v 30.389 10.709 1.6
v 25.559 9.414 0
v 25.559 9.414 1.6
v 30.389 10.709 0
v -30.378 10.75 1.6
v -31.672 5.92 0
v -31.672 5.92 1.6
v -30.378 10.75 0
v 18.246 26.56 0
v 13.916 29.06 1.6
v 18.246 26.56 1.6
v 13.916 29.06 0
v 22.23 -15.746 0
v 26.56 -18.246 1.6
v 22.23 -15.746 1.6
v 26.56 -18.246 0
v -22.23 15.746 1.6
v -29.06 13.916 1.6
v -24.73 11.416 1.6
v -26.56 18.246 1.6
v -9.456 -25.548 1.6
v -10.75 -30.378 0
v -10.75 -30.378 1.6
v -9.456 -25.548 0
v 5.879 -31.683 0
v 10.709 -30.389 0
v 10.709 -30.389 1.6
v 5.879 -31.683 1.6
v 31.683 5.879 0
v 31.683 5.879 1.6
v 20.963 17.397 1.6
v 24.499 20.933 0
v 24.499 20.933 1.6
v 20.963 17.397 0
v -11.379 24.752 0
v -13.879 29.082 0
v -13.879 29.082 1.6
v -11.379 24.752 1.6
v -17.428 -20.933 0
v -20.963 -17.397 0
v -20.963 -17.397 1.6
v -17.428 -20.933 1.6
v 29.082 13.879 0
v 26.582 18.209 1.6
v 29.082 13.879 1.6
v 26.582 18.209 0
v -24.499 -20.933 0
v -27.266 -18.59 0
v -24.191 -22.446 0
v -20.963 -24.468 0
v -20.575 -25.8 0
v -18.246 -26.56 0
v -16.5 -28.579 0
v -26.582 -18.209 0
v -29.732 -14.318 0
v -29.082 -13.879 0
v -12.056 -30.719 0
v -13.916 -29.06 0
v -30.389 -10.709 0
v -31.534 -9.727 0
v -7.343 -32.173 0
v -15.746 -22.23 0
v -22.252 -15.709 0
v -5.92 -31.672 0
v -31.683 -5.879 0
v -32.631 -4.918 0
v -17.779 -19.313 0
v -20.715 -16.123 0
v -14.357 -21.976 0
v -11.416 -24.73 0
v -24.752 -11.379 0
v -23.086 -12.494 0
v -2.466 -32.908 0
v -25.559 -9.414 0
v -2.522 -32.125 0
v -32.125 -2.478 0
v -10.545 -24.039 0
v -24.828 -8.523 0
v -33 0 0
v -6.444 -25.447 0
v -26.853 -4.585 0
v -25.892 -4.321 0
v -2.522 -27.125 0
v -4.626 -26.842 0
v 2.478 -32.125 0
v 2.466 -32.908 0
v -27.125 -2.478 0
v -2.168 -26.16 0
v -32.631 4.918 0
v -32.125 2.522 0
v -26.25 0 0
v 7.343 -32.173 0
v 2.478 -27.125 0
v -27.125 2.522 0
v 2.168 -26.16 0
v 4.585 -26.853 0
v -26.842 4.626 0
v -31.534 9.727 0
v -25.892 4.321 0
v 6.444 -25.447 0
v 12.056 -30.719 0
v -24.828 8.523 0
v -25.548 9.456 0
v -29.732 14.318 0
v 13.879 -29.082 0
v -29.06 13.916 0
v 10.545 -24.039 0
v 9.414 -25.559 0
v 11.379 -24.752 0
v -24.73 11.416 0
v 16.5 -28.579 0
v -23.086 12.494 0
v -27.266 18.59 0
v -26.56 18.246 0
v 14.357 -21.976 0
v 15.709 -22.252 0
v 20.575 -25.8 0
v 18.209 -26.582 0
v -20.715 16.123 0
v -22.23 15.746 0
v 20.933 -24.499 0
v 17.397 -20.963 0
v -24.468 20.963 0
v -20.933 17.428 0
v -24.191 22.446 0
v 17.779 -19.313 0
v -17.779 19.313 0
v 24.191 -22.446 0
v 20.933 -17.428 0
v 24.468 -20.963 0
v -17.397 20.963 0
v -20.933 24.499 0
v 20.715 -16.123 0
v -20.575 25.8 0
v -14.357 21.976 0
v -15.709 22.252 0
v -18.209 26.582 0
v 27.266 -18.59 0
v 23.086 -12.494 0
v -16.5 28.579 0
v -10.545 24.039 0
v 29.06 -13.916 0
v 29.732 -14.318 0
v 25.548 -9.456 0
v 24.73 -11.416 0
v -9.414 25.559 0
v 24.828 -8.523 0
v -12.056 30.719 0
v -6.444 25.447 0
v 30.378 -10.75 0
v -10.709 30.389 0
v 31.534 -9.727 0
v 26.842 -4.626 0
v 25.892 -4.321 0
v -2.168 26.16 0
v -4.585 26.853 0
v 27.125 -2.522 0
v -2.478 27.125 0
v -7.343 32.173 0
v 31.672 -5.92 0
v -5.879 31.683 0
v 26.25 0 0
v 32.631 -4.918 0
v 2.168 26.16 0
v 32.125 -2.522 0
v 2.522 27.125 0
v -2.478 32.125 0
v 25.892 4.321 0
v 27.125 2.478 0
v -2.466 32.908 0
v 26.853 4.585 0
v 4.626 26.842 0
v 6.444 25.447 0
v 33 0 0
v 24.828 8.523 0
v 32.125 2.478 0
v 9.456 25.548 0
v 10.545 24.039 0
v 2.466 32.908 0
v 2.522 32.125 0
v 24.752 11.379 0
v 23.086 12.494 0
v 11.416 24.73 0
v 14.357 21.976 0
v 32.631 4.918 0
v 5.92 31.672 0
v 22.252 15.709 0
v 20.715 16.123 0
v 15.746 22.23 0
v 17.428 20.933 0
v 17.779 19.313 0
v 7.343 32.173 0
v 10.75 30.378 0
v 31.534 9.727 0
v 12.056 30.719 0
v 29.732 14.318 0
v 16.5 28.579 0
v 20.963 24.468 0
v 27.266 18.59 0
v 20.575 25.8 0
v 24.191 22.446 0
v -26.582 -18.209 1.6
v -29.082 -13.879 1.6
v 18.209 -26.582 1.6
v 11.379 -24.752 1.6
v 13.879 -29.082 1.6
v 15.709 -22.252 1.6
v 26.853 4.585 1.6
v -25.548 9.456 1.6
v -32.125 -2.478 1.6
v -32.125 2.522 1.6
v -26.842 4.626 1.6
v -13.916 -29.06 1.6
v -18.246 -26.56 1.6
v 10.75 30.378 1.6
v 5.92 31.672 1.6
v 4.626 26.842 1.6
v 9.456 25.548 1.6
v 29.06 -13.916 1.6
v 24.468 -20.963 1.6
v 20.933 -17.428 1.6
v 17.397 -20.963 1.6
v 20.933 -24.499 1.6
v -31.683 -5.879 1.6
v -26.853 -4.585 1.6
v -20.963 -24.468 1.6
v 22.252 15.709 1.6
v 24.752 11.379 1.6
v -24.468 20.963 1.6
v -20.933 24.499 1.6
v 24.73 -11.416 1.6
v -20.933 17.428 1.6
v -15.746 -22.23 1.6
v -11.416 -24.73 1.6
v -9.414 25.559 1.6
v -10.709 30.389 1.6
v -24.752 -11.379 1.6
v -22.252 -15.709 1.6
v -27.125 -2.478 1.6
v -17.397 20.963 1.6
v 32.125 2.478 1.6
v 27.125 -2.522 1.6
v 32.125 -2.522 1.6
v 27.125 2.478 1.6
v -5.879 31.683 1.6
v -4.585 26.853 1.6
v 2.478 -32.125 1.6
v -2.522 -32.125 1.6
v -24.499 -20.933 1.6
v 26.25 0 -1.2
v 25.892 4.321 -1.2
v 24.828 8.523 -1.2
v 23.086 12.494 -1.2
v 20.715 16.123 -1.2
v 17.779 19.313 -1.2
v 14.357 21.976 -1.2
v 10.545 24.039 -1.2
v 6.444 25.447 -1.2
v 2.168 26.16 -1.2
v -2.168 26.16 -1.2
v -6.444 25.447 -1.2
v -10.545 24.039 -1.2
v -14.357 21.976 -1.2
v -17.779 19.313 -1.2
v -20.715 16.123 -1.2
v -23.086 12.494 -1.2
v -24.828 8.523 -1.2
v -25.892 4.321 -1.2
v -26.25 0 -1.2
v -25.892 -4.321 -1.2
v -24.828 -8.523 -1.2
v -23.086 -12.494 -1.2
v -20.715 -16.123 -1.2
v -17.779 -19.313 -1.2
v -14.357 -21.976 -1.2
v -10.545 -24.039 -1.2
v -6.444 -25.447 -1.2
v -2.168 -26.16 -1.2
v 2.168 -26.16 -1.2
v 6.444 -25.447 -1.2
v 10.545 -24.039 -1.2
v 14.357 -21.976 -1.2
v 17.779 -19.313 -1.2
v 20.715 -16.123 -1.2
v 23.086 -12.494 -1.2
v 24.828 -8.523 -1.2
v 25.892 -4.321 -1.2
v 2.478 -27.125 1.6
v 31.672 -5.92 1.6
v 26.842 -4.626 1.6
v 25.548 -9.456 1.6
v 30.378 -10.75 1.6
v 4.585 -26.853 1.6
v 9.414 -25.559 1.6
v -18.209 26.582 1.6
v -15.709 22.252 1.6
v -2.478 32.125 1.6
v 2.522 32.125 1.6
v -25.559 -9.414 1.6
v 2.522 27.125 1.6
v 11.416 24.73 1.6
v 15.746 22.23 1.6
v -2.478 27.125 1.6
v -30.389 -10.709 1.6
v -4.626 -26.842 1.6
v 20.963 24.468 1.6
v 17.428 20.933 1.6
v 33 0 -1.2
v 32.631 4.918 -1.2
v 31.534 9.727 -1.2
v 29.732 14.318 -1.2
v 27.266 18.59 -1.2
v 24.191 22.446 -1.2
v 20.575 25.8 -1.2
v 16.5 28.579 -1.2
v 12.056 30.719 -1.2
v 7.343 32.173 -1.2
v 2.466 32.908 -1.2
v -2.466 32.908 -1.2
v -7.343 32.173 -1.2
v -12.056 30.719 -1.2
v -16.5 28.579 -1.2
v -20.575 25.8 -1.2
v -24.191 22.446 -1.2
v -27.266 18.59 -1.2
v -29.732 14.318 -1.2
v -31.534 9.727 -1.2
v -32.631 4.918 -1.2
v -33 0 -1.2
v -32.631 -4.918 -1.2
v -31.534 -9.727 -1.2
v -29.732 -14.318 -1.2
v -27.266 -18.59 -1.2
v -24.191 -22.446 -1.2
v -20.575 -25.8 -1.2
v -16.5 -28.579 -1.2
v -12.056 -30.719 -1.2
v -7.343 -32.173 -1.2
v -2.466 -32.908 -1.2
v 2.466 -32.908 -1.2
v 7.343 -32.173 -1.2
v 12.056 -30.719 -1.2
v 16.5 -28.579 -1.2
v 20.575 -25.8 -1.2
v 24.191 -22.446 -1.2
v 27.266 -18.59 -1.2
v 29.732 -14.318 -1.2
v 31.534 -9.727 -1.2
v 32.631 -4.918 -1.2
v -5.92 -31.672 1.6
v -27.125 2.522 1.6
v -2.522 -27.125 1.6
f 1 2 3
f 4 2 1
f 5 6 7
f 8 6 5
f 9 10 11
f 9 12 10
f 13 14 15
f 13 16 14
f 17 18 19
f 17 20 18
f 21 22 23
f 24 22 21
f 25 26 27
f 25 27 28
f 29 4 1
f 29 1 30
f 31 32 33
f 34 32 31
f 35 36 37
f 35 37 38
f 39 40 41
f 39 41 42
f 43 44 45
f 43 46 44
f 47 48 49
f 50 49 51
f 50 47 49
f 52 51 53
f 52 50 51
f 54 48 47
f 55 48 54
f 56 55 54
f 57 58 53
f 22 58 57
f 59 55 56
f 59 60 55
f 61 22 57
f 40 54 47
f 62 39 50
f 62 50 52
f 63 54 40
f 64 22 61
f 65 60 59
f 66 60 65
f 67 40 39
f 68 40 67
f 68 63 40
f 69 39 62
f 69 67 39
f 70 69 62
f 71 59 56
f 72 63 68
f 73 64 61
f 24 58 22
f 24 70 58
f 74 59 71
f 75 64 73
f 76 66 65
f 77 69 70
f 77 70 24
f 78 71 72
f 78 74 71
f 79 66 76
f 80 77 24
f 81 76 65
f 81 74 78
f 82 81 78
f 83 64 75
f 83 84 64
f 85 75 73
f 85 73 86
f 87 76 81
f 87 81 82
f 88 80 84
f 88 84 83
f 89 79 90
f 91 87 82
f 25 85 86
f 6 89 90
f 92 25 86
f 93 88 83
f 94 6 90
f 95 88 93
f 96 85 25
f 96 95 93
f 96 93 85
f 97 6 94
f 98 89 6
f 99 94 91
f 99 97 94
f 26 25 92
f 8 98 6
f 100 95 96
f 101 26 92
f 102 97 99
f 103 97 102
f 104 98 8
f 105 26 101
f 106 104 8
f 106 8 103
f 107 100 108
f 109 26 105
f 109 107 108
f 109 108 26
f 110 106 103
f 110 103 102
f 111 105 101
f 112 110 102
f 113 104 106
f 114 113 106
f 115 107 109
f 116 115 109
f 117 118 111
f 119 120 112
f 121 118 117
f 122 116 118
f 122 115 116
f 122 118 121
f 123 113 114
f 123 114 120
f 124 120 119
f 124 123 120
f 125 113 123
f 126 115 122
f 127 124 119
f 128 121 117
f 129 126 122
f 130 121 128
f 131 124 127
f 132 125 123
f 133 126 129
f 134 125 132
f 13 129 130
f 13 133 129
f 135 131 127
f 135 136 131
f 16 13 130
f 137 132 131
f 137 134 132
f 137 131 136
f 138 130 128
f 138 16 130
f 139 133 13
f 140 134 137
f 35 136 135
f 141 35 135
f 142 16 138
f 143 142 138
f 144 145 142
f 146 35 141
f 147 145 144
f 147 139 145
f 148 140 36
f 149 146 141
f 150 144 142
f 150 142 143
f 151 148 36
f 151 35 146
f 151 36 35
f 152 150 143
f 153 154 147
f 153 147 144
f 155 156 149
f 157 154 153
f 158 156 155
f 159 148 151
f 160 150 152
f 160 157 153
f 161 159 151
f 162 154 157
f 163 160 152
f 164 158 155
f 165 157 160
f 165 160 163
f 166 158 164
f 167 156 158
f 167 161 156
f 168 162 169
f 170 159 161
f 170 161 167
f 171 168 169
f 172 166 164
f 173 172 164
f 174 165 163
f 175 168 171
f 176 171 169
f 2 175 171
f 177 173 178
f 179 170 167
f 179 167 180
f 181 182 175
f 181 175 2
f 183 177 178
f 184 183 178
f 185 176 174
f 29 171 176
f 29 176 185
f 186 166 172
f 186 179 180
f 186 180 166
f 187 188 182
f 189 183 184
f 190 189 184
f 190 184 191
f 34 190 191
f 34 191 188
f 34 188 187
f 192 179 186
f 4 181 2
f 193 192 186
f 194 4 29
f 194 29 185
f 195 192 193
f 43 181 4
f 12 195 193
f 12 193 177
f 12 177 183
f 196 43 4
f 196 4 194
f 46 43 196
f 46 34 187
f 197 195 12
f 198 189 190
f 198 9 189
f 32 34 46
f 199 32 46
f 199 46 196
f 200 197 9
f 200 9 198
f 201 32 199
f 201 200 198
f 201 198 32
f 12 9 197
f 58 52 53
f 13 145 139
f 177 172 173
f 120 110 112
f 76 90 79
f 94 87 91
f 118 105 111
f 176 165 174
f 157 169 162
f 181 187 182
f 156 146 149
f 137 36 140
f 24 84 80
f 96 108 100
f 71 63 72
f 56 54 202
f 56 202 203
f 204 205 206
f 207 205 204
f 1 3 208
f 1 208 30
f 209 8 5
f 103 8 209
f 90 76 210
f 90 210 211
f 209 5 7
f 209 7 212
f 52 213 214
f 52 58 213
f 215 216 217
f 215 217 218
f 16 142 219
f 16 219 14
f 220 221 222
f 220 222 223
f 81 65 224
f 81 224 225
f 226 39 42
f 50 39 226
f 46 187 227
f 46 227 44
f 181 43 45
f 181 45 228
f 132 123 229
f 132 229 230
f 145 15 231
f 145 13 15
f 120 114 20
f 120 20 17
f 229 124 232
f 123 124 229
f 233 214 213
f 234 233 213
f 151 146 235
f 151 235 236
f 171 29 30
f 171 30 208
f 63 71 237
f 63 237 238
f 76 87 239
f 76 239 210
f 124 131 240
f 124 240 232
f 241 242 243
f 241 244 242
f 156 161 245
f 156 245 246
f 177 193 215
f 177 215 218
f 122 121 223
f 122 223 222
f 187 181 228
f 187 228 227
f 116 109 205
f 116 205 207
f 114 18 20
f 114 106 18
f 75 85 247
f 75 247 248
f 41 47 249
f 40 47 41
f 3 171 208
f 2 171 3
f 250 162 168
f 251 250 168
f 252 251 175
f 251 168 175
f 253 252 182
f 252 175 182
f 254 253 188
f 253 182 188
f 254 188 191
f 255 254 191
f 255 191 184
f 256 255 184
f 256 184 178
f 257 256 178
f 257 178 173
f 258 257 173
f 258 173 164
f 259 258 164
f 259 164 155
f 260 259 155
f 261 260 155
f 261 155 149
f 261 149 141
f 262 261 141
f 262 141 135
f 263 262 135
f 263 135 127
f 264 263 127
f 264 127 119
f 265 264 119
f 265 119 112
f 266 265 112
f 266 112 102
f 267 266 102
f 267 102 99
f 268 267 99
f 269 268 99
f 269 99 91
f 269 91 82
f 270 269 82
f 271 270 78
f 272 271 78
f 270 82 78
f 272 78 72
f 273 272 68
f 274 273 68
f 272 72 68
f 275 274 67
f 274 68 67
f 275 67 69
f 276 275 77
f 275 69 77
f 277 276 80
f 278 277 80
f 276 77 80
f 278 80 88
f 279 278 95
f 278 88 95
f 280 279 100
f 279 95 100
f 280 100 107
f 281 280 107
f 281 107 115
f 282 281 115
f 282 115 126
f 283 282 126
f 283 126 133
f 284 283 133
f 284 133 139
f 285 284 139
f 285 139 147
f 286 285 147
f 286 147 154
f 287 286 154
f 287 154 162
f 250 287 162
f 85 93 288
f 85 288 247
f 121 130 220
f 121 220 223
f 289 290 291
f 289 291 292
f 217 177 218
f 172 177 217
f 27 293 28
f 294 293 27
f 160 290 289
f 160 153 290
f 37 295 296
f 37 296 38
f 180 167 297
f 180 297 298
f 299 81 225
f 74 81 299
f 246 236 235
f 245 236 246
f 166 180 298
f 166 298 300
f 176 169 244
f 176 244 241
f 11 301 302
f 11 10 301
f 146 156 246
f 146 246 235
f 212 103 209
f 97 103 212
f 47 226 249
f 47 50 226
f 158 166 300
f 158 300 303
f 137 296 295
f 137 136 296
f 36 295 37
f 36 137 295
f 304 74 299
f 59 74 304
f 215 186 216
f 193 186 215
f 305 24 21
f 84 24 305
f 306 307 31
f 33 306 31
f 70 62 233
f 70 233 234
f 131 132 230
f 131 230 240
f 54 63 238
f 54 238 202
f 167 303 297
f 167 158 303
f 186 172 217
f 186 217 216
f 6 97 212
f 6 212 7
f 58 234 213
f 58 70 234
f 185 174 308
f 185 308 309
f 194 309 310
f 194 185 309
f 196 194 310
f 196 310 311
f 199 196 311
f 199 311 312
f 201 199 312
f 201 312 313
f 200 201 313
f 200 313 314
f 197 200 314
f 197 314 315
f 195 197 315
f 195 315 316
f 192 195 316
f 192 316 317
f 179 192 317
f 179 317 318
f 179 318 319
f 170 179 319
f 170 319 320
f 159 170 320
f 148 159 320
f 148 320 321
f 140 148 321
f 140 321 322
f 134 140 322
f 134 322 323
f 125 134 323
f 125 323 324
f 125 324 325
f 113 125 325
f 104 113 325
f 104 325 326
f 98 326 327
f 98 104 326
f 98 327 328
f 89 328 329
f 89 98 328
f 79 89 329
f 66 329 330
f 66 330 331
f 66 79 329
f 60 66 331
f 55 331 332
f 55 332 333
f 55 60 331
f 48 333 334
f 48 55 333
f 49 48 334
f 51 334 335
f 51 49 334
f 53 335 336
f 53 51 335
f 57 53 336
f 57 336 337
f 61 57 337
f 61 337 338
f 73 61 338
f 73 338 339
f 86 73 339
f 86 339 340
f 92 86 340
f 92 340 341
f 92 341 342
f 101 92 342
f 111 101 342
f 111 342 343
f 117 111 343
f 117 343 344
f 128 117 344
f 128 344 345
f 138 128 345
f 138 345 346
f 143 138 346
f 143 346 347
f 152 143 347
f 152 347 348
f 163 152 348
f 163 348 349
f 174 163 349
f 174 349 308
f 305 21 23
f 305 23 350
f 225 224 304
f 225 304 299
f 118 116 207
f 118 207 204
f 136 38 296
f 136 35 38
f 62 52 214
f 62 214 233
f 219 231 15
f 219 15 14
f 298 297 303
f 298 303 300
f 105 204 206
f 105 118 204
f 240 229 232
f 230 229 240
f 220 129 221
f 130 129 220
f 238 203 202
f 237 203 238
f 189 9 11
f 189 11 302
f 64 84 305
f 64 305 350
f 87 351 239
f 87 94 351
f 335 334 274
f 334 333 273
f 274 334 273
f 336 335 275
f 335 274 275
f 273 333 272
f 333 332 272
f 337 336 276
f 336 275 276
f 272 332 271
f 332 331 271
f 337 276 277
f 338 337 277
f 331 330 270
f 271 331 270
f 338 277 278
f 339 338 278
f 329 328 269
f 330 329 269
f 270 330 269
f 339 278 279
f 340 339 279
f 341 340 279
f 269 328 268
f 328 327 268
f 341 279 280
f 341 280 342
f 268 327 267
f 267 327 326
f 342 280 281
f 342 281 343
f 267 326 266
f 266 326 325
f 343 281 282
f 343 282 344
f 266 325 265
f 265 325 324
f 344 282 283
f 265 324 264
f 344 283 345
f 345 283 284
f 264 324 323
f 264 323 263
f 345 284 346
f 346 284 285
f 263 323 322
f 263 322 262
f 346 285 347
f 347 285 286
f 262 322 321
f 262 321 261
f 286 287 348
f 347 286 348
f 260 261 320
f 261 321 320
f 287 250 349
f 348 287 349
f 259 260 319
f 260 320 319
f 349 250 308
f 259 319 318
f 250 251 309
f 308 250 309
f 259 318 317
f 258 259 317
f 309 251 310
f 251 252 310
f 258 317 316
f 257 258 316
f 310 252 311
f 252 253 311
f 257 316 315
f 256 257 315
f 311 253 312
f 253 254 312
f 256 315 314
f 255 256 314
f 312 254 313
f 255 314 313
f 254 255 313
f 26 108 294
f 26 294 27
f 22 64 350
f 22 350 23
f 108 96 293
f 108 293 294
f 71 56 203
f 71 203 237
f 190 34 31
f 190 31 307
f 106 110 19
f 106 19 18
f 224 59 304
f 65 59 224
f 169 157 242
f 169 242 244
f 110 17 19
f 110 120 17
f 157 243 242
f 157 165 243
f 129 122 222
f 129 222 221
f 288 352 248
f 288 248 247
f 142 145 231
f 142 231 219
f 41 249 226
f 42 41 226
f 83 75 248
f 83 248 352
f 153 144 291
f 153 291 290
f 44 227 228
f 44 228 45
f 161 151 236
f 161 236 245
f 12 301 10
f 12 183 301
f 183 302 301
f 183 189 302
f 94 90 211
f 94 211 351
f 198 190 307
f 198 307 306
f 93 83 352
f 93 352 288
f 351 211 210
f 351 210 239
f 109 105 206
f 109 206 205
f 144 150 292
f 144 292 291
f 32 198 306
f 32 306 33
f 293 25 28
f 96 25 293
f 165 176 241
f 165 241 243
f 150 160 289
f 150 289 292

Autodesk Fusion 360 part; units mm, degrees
sketch "Sketch1" plane through (0, 0, 0) normal (0, 0, 1) x (1, 0, 0)
  circle A0 centre (0, 0) radius 33
  circle A1 centre (0, 0) radius 26.25
  line L0 (0.0215, 33) -> (0.0215, 26.25) construction
  line L1 (2.5215, 27.125) -> (-2.4785, 27.125)
  line L2 (-2.4785, 27.125) -> (-2.4785, 32.125)
  line L3 (-2.4785, 32.125) -> (2.5215, 32.125)
  line L4 (2.5215, 32.125) -> (2.5215, 27.125)
  line L5 (2.5215, 27.125) -> (-2.4785, 32.125) construction
  line L6 (-2.4785, 27.125) -> (2.5215, 32.125) construction
  line L7 (-10.7086, 30.3889) -> (-5.879, 31.683)
  line L8 (-5.879, 31.683) -> (-4.5849, 26.8533)
  line L9 (-4.5849, 26.8533) -> (-9.4145, 25.5592)
  line L10 (-9.4145, 25.5592) -> (-10.7086, 30.3889)
  line L11 (-18.2089, 26.5818) -> (-13.8788, 29.0818)
  line L12 (-13.8788, 29.0818) -> (-11.3788, 24.7517)
  line L13 (-11.3788, 24.7517) -> (-15.7089, 22.2517)
  line L14 (-15.7089, 22.2517) -> (-18.2089, 26.5818)
  line L15 (-24.4684, 20.9632) -> (-20.9328, 24.4988)
  line L16 (-20.9328, 24.4988) -> (-17.3973, 20.9632)
  line L17 (-17.3973, 20.9632) -> (-20.9328, 17.4277)
  line L18 (-20.9328, 17.4277) -> (-24.4684, 20.9632)
  line L19 (-29.0603, 13.9161) -> (-26.5603, 18.2462)
  line L20 (-26.5603, 18.2462) -> (-22.2302, 15.7462)
  line L21 (-22.2302, 15.7462) -> (-24.7302, 11.4161)
  line L22 (-24.7302, 11.4161) -> (-29.0603, 13.9161)
  line L23 (-31.6718, 5.9205) -> (-30.3777, 10.7501)
  line L24 (-30.3777, 10.7501) -> (-25.5481, 9.456)
  line L25 (-25.5481, 9.456) -> (-26.8422, 4.6264)
  line L26 (-26.8422, 4.6264) -> (-31.6718, 5.9205)
  line L27 (-32.125, -2.4785) -> (-32.125, 2.5215)
  line L28 (-32.125, 2.5215) -> (-27.125, 2.5215)
  line L29 (-27.125, 2.5215) -> (-27.125, -2.4785)
  line L30 (-27.125, -2.4785) -> (-32.125, -2.4785)
  line L31 (-30.3889, -10.7086) -> (-31.683, -5.879)
  line L32 (-31.683, -5.879) -> (-26.8533, -4.5849)
  line L33 (-26.8533, -4.5849) -> (-25.5592, -9.4145)
  line L34 (-25.5592, -9.4145) -> (-30.3889, -10.7086)
  line L35 (-26.5818, -18.2089) -> (-29.0818, -13.8788)
  line L36 (-29.0818, -13.8788) -> (-24.7517, -11.3788)
  line L37 (-24.7517, -11.3788) -> (-22.2517, -15.7089)
  line L38 (-22.2517, -15.7089) -> (-26.5818, -18.2089)
  line L39 (-20.9632, -24.4684) -> (-24.4988, -20.9328)
  line L40 (-24.4988, -20.9328) -> (-20.9632, -17.3973)
  line L41 (-20.9632, -17.3973) -> (-17.4277, -20.9328)
  line L42 (-17.4277, -20.9328) -> (-20.9632, -24.4684)
  line L43 (-13.9161, -29.0603) -> (-18.2462, -26.5603)
  line L44 (-18.2462, -26.5603) -> (-15.7462, -22.2302)
  line L45 (-15.7462, -22.2302) -> (-11.4161, -24.7302)
  line L46 (-11.4161, -24.7302) -> (-13.9161, -29.0603)
  line L47 (-5.9205, -31.6718) -> (-10.7501, -30.3777)
  line L48 (-10.7501, -30.3777) -> (-9.456, -25.5481)
  line L49 (-9.456, -25.5481) -> (-4.6264, -26.8422)
  line L50 (-4.6264, -26.8422) -> (-5.9205, -31.6718)
  line L51 (2.4785, -32.125) -> (-2.5215, -32.125)
  line L52 (-2.5215, -32.125) -> (-2.5215, -27.125)
  line L53 (-2.5215, -27.125) -> (2.4785, -27.125)
  line L54 (2.4785, -27.125) -> (2.4785, -32.125)
  line L55 (10.7086, -30.3889) -> (5.879, -31.683)
  line L56 (5.879, -31.683) -> (4.5849, -26.8533)
  line L57 (4.5849, -26.8533) -> (9.4145, -25.5592)
  line L58 (9.4145, -25.5592) -> (10.7086, -30.3889)
  line L59 (18.2089, -26.5818) -> (13.8788, -29.0818)
  line L60 (13.8788, -29.0818) -> (11.3788, -24.7517)
  line L61 (11.3788, -24.7517) -> (15.7089, -22.2517)
  line L62 (15.7089, -22.2517) -> (18.2089, -26.5818)
  line L63 (24.4684, -20.9632) -> (20.9328, -24.4988)
  line L64 (20.9328, -24.4988) -> (17.3973, -20.9632)
  line L65 (17.3973, -20.9632) -> (20.9328, -17.4277)
  line L66 (20.9328, -17.4277) -> (24.4684, -20.9632)
  line L67 (29.0603, -13.9161) -> (26.5603, -18.2462)
  line L68 (26.5603, -18.2462) -> (22.2302, -15.7462)
  line L69 (22.2302, -15.7462) -> (24.7302, -11.4161)
  line L70 (24.7302, -11.4161) -> (29.0603, -13.9161)
  line L71 (31.6718, -5.9205) -> (30.3777, -10.7501)
  line L72 (30.3777, -10.7501) -> (25.5481, -9.456)
  line L73 (25.5481, -9.456) -> (26.8422, -4.6264)
  line L74 (26.8422, -4.6264) -> (31.6718, -5.9205)
  line L75 (32.125, 2.4785) -> (32.125, -2.5215)
  line L76 (32.125, -2.5215) -> (27.125, -2.5215)
  line L77 (27.125, -2.5215) -> (27.125, 2.4785)
  line L78 (27.125, 2.4785) -> (32.125, 2.4785)
  line L79 (30.3889, 10.7086) -> (31.683, 5.879)
  line L80 (31.683, 5.879) -> (26.8533, 4.5849)
  line L81 (26.8533, 4.5849) -> (25.5592, 9.4145)
  line L82 (25.5592, 9.4145) -> (30.3889, 10.7086)
  line L83 (26.5818, 18.2089) -> (29.0818, 13.8788)
  line L84 (29.0818, 13.8788) -> (24.7517, 11.3788)
  line L85 (24.7517, 11.3788) -> (22.2517, 15.7089)
  line L86 (22.2517, 15.7089) -> (26.5818, 18.2089)
  line L87 (20.9632, 24.4684) -> (24.4988, 20.9328)
  line L88 (24.4988, 20.9328) -> (20.9632, 17.3973)
  line L89 (20.9632, 17.3973) -> (17.4277, 20.9328)
  line L90 (17.4277, 20.9328) -> (20.9632, 24.4684)
  line L91 (13.9161, 29.0603) -> (18.2462, 26.5603)
  line L92 (18.2462, 26.5603) -> (15.7462, 22.2302)
  line L93 (15.7462, 22.2302) -> (11.4161, 24.7302)
  line L94 (11.4161, 24.7302) -> (13.9161, 29.0603)
  line L95 (5.9205, 31.6718) -> (10.7501, 30.3777)
  line L96 (10.7501, 30.3777) -> (9.456, 25.5481)
  line L97 (9.456, 25.5481) -> (4.6264, 26.8422)
  line L98 (4.6264, 26.8422) -> (5.9205, 31.6718)
  point P0 (0.0215, 29.625)
  dimension "d1" = 66
  dimension "d2" = 52.5
  dimension "d3" = 5
  dimension "d4" = 5
  dimension "d6" = 360
extrude "Extrude1" add sketch "Sketch1" against normal blind 1.2 contours A0 | L1 L2 L3 L4 | L7 L8 L9 L10 | L11 L12 L13 L14 | L15 L16 L17 L18 | L19 L20 L21 L22 | L23 L24 L25 L26 | L27 L28 L29 L30 | L31 L32 L33 L34 | L35 L36 L37 L38 | L39 L40 L41 L42 | L43 L44 L45 L46 | L47 L48 L49 L50 | L51 L52 L53 L54 | L55 L56 L57 L58 | L59 L60 L61 L62 | L63 L64 L65 L66 | L67 L68 L69 L70 | L71 L72 L73 L74 | L75 L76 L77 L78 | L79 L80 L81 L82 | L83 L84 L85 L86 | L87 L88 L89 L90 | L91 L92 L93 L94 | L95 L96 L97 L98
extrude "Extrude2" add sketch "Sketch1" along normal blind 1.6 contours L1 L2 L3 L4 | L7 L8 L9 L10 | L11 L12 L13 L14 | L15 L16 L17 L18 | L19 L20 L21 L22 | L23 L24 L25 L26 | L27 L28 L29 L30 | L31 L32 L33 L34 | L35 L36 L37 L38 | L39 L40 L41 L42 | L43 L44 L45 L46 | L47 L48 L49 L50 | L51 L52 L53 L54 | L55 L56 L57 L58 | L59 L60 L61 L62 | L63 L64 L65 L66 | L67 L68 L69 L70 | L71 L72 L73 L74 | L75 L76 L77 L78 | L79 L80 L81 L82 | L83 L84 L85 L86 | L87 L88 L89 L90 | L91 L92 L93 L94 | L95 L96 L97 L98
